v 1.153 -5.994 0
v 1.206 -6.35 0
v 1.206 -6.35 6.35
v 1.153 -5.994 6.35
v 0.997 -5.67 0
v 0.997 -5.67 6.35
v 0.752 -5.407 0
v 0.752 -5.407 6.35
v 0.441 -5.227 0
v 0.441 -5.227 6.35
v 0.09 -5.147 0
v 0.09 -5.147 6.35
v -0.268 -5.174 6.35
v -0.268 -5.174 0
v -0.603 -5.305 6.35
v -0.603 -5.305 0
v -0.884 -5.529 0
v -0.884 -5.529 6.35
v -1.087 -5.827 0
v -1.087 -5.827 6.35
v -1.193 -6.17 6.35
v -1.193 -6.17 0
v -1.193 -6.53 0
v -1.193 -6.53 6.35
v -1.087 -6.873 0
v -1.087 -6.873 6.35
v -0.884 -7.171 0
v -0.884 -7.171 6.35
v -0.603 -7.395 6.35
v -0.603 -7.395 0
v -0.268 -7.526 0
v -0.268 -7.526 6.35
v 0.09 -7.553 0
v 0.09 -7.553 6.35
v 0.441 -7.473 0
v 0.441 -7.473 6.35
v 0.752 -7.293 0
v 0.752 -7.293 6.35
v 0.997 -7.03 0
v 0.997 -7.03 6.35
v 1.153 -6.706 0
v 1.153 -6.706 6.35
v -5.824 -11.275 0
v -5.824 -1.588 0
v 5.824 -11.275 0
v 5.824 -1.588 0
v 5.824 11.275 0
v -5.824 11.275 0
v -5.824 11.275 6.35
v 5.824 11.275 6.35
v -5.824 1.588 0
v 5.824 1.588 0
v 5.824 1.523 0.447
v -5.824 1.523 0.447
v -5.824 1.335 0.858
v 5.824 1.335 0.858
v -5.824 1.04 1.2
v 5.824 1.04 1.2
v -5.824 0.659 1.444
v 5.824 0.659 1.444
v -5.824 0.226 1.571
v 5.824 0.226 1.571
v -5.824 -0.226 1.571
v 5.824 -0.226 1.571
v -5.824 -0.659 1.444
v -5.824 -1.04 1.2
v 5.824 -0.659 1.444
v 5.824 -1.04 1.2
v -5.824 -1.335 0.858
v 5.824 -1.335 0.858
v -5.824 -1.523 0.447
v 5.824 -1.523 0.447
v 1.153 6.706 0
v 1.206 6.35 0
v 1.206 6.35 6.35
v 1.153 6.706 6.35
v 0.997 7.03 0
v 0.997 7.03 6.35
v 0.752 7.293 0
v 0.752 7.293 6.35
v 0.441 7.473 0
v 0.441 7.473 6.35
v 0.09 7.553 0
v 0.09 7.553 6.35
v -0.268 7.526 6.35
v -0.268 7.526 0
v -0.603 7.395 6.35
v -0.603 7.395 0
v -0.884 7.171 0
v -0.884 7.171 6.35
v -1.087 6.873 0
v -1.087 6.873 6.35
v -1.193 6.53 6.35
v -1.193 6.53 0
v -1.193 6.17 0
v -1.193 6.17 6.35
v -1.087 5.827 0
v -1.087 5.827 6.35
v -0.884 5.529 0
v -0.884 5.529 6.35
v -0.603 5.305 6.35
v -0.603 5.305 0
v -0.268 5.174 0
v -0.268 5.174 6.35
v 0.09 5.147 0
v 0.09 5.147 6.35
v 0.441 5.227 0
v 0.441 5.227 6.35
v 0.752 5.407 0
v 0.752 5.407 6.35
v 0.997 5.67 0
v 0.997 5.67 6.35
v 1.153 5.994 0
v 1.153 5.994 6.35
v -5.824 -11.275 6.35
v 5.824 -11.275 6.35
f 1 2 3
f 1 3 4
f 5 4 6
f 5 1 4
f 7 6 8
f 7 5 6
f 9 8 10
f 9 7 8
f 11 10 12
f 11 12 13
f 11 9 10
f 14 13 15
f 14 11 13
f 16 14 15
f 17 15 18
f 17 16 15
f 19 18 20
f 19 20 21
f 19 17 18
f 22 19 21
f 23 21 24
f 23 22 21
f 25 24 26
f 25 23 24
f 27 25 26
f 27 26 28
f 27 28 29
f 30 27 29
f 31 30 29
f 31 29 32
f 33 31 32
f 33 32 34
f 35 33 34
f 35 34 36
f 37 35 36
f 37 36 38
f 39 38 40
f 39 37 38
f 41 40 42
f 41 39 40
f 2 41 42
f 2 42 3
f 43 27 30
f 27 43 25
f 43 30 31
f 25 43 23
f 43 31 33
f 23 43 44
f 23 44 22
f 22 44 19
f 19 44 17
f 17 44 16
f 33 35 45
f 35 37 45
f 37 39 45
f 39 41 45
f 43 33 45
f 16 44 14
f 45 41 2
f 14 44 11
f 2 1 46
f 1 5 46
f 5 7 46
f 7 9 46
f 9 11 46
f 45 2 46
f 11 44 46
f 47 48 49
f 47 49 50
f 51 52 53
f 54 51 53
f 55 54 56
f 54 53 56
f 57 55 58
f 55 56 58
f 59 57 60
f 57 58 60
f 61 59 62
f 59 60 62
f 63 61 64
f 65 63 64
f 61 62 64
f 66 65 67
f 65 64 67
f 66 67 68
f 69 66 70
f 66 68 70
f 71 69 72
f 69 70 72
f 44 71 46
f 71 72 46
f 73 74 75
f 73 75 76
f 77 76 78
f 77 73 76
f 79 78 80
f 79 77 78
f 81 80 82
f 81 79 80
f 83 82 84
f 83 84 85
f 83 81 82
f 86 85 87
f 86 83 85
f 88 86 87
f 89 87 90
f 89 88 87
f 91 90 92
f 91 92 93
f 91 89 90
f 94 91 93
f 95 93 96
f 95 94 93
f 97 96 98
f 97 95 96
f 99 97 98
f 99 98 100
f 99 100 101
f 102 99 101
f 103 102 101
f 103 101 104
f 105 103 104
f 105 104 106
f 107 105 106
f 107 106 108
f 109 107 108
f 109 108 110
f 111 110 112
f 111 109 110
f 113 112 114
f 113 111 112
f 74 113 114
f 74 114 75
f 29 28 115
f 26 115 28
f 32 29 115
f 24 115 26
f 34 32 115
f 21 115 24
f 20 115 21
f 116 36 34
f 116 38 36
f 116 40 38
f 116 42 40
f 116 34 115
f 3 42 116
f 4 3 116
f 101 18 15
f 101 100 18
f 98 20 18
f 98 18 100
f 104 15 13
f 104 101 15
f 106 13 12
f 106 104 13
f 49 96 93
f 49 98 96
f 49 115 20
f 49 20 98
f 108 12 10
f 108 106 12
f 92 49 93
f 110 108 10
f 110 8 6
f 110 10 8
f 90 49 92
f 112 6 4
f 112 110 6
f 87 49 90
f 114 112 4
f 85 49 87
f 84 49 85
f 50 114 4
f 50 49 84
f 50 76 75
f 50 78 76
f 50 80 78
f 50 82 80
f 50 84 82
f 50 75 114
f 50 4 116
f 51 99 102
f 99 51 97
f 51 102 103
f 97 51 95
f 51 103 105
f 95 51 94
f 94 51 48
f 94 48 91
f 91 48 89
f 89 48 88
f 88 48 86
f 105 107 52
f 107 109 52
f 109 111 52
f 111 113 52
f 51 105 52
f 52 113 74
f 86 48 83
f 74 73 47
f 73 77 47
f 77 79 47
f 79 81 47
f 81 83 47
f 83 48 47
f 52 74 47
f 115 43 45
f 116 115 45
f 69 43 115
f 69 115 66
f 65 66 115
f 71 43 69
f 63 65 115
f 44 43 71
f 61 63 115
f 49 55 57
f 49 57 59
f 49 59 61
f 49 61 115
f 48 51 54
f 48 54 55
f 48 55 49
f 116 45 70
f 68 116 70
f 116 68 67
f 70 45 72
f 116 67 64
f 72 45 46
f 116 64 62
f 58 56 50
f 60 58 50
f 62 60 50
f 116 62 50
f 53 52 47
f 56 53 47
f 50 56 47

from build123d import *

# Parameters (mm, degrees)
F0_W     = 11.648168
F0_H     = 22.549662
F0_R     = 1.2065
F2_DEPTH = 6.35
F3_D     = 3.175
F5_D     = 3.175


with BuildPart() as f2:
    # F0 (on Top) → F2 (new body)
    with BuildSketch(Plane.XY):
        Rectangle(F0_W, F0_H)
        with Locations((0, -6.35)):
            Circle(F0_R, mode=Mode.SUBTRACT)
        with Locations((0, 6.35)):
            Circle(F0_R, mode=Mode.SUBTRACT)
    extrude(amount=F2_DEPTH)

    # F3 (through all)
    with Locations(Plane(origin=(0, 0, 0), x_dir=(0, 1, 0), z_dir=(-1, 0, 0))):
        with Locations((0, 0)):
            Hole(F3_D / 2)

    # F5 (through all)
    with Locations(Plane.YZ):
        with Locations((0, 0)):
            Hole(F5_D / 2)


solid = f2.part
